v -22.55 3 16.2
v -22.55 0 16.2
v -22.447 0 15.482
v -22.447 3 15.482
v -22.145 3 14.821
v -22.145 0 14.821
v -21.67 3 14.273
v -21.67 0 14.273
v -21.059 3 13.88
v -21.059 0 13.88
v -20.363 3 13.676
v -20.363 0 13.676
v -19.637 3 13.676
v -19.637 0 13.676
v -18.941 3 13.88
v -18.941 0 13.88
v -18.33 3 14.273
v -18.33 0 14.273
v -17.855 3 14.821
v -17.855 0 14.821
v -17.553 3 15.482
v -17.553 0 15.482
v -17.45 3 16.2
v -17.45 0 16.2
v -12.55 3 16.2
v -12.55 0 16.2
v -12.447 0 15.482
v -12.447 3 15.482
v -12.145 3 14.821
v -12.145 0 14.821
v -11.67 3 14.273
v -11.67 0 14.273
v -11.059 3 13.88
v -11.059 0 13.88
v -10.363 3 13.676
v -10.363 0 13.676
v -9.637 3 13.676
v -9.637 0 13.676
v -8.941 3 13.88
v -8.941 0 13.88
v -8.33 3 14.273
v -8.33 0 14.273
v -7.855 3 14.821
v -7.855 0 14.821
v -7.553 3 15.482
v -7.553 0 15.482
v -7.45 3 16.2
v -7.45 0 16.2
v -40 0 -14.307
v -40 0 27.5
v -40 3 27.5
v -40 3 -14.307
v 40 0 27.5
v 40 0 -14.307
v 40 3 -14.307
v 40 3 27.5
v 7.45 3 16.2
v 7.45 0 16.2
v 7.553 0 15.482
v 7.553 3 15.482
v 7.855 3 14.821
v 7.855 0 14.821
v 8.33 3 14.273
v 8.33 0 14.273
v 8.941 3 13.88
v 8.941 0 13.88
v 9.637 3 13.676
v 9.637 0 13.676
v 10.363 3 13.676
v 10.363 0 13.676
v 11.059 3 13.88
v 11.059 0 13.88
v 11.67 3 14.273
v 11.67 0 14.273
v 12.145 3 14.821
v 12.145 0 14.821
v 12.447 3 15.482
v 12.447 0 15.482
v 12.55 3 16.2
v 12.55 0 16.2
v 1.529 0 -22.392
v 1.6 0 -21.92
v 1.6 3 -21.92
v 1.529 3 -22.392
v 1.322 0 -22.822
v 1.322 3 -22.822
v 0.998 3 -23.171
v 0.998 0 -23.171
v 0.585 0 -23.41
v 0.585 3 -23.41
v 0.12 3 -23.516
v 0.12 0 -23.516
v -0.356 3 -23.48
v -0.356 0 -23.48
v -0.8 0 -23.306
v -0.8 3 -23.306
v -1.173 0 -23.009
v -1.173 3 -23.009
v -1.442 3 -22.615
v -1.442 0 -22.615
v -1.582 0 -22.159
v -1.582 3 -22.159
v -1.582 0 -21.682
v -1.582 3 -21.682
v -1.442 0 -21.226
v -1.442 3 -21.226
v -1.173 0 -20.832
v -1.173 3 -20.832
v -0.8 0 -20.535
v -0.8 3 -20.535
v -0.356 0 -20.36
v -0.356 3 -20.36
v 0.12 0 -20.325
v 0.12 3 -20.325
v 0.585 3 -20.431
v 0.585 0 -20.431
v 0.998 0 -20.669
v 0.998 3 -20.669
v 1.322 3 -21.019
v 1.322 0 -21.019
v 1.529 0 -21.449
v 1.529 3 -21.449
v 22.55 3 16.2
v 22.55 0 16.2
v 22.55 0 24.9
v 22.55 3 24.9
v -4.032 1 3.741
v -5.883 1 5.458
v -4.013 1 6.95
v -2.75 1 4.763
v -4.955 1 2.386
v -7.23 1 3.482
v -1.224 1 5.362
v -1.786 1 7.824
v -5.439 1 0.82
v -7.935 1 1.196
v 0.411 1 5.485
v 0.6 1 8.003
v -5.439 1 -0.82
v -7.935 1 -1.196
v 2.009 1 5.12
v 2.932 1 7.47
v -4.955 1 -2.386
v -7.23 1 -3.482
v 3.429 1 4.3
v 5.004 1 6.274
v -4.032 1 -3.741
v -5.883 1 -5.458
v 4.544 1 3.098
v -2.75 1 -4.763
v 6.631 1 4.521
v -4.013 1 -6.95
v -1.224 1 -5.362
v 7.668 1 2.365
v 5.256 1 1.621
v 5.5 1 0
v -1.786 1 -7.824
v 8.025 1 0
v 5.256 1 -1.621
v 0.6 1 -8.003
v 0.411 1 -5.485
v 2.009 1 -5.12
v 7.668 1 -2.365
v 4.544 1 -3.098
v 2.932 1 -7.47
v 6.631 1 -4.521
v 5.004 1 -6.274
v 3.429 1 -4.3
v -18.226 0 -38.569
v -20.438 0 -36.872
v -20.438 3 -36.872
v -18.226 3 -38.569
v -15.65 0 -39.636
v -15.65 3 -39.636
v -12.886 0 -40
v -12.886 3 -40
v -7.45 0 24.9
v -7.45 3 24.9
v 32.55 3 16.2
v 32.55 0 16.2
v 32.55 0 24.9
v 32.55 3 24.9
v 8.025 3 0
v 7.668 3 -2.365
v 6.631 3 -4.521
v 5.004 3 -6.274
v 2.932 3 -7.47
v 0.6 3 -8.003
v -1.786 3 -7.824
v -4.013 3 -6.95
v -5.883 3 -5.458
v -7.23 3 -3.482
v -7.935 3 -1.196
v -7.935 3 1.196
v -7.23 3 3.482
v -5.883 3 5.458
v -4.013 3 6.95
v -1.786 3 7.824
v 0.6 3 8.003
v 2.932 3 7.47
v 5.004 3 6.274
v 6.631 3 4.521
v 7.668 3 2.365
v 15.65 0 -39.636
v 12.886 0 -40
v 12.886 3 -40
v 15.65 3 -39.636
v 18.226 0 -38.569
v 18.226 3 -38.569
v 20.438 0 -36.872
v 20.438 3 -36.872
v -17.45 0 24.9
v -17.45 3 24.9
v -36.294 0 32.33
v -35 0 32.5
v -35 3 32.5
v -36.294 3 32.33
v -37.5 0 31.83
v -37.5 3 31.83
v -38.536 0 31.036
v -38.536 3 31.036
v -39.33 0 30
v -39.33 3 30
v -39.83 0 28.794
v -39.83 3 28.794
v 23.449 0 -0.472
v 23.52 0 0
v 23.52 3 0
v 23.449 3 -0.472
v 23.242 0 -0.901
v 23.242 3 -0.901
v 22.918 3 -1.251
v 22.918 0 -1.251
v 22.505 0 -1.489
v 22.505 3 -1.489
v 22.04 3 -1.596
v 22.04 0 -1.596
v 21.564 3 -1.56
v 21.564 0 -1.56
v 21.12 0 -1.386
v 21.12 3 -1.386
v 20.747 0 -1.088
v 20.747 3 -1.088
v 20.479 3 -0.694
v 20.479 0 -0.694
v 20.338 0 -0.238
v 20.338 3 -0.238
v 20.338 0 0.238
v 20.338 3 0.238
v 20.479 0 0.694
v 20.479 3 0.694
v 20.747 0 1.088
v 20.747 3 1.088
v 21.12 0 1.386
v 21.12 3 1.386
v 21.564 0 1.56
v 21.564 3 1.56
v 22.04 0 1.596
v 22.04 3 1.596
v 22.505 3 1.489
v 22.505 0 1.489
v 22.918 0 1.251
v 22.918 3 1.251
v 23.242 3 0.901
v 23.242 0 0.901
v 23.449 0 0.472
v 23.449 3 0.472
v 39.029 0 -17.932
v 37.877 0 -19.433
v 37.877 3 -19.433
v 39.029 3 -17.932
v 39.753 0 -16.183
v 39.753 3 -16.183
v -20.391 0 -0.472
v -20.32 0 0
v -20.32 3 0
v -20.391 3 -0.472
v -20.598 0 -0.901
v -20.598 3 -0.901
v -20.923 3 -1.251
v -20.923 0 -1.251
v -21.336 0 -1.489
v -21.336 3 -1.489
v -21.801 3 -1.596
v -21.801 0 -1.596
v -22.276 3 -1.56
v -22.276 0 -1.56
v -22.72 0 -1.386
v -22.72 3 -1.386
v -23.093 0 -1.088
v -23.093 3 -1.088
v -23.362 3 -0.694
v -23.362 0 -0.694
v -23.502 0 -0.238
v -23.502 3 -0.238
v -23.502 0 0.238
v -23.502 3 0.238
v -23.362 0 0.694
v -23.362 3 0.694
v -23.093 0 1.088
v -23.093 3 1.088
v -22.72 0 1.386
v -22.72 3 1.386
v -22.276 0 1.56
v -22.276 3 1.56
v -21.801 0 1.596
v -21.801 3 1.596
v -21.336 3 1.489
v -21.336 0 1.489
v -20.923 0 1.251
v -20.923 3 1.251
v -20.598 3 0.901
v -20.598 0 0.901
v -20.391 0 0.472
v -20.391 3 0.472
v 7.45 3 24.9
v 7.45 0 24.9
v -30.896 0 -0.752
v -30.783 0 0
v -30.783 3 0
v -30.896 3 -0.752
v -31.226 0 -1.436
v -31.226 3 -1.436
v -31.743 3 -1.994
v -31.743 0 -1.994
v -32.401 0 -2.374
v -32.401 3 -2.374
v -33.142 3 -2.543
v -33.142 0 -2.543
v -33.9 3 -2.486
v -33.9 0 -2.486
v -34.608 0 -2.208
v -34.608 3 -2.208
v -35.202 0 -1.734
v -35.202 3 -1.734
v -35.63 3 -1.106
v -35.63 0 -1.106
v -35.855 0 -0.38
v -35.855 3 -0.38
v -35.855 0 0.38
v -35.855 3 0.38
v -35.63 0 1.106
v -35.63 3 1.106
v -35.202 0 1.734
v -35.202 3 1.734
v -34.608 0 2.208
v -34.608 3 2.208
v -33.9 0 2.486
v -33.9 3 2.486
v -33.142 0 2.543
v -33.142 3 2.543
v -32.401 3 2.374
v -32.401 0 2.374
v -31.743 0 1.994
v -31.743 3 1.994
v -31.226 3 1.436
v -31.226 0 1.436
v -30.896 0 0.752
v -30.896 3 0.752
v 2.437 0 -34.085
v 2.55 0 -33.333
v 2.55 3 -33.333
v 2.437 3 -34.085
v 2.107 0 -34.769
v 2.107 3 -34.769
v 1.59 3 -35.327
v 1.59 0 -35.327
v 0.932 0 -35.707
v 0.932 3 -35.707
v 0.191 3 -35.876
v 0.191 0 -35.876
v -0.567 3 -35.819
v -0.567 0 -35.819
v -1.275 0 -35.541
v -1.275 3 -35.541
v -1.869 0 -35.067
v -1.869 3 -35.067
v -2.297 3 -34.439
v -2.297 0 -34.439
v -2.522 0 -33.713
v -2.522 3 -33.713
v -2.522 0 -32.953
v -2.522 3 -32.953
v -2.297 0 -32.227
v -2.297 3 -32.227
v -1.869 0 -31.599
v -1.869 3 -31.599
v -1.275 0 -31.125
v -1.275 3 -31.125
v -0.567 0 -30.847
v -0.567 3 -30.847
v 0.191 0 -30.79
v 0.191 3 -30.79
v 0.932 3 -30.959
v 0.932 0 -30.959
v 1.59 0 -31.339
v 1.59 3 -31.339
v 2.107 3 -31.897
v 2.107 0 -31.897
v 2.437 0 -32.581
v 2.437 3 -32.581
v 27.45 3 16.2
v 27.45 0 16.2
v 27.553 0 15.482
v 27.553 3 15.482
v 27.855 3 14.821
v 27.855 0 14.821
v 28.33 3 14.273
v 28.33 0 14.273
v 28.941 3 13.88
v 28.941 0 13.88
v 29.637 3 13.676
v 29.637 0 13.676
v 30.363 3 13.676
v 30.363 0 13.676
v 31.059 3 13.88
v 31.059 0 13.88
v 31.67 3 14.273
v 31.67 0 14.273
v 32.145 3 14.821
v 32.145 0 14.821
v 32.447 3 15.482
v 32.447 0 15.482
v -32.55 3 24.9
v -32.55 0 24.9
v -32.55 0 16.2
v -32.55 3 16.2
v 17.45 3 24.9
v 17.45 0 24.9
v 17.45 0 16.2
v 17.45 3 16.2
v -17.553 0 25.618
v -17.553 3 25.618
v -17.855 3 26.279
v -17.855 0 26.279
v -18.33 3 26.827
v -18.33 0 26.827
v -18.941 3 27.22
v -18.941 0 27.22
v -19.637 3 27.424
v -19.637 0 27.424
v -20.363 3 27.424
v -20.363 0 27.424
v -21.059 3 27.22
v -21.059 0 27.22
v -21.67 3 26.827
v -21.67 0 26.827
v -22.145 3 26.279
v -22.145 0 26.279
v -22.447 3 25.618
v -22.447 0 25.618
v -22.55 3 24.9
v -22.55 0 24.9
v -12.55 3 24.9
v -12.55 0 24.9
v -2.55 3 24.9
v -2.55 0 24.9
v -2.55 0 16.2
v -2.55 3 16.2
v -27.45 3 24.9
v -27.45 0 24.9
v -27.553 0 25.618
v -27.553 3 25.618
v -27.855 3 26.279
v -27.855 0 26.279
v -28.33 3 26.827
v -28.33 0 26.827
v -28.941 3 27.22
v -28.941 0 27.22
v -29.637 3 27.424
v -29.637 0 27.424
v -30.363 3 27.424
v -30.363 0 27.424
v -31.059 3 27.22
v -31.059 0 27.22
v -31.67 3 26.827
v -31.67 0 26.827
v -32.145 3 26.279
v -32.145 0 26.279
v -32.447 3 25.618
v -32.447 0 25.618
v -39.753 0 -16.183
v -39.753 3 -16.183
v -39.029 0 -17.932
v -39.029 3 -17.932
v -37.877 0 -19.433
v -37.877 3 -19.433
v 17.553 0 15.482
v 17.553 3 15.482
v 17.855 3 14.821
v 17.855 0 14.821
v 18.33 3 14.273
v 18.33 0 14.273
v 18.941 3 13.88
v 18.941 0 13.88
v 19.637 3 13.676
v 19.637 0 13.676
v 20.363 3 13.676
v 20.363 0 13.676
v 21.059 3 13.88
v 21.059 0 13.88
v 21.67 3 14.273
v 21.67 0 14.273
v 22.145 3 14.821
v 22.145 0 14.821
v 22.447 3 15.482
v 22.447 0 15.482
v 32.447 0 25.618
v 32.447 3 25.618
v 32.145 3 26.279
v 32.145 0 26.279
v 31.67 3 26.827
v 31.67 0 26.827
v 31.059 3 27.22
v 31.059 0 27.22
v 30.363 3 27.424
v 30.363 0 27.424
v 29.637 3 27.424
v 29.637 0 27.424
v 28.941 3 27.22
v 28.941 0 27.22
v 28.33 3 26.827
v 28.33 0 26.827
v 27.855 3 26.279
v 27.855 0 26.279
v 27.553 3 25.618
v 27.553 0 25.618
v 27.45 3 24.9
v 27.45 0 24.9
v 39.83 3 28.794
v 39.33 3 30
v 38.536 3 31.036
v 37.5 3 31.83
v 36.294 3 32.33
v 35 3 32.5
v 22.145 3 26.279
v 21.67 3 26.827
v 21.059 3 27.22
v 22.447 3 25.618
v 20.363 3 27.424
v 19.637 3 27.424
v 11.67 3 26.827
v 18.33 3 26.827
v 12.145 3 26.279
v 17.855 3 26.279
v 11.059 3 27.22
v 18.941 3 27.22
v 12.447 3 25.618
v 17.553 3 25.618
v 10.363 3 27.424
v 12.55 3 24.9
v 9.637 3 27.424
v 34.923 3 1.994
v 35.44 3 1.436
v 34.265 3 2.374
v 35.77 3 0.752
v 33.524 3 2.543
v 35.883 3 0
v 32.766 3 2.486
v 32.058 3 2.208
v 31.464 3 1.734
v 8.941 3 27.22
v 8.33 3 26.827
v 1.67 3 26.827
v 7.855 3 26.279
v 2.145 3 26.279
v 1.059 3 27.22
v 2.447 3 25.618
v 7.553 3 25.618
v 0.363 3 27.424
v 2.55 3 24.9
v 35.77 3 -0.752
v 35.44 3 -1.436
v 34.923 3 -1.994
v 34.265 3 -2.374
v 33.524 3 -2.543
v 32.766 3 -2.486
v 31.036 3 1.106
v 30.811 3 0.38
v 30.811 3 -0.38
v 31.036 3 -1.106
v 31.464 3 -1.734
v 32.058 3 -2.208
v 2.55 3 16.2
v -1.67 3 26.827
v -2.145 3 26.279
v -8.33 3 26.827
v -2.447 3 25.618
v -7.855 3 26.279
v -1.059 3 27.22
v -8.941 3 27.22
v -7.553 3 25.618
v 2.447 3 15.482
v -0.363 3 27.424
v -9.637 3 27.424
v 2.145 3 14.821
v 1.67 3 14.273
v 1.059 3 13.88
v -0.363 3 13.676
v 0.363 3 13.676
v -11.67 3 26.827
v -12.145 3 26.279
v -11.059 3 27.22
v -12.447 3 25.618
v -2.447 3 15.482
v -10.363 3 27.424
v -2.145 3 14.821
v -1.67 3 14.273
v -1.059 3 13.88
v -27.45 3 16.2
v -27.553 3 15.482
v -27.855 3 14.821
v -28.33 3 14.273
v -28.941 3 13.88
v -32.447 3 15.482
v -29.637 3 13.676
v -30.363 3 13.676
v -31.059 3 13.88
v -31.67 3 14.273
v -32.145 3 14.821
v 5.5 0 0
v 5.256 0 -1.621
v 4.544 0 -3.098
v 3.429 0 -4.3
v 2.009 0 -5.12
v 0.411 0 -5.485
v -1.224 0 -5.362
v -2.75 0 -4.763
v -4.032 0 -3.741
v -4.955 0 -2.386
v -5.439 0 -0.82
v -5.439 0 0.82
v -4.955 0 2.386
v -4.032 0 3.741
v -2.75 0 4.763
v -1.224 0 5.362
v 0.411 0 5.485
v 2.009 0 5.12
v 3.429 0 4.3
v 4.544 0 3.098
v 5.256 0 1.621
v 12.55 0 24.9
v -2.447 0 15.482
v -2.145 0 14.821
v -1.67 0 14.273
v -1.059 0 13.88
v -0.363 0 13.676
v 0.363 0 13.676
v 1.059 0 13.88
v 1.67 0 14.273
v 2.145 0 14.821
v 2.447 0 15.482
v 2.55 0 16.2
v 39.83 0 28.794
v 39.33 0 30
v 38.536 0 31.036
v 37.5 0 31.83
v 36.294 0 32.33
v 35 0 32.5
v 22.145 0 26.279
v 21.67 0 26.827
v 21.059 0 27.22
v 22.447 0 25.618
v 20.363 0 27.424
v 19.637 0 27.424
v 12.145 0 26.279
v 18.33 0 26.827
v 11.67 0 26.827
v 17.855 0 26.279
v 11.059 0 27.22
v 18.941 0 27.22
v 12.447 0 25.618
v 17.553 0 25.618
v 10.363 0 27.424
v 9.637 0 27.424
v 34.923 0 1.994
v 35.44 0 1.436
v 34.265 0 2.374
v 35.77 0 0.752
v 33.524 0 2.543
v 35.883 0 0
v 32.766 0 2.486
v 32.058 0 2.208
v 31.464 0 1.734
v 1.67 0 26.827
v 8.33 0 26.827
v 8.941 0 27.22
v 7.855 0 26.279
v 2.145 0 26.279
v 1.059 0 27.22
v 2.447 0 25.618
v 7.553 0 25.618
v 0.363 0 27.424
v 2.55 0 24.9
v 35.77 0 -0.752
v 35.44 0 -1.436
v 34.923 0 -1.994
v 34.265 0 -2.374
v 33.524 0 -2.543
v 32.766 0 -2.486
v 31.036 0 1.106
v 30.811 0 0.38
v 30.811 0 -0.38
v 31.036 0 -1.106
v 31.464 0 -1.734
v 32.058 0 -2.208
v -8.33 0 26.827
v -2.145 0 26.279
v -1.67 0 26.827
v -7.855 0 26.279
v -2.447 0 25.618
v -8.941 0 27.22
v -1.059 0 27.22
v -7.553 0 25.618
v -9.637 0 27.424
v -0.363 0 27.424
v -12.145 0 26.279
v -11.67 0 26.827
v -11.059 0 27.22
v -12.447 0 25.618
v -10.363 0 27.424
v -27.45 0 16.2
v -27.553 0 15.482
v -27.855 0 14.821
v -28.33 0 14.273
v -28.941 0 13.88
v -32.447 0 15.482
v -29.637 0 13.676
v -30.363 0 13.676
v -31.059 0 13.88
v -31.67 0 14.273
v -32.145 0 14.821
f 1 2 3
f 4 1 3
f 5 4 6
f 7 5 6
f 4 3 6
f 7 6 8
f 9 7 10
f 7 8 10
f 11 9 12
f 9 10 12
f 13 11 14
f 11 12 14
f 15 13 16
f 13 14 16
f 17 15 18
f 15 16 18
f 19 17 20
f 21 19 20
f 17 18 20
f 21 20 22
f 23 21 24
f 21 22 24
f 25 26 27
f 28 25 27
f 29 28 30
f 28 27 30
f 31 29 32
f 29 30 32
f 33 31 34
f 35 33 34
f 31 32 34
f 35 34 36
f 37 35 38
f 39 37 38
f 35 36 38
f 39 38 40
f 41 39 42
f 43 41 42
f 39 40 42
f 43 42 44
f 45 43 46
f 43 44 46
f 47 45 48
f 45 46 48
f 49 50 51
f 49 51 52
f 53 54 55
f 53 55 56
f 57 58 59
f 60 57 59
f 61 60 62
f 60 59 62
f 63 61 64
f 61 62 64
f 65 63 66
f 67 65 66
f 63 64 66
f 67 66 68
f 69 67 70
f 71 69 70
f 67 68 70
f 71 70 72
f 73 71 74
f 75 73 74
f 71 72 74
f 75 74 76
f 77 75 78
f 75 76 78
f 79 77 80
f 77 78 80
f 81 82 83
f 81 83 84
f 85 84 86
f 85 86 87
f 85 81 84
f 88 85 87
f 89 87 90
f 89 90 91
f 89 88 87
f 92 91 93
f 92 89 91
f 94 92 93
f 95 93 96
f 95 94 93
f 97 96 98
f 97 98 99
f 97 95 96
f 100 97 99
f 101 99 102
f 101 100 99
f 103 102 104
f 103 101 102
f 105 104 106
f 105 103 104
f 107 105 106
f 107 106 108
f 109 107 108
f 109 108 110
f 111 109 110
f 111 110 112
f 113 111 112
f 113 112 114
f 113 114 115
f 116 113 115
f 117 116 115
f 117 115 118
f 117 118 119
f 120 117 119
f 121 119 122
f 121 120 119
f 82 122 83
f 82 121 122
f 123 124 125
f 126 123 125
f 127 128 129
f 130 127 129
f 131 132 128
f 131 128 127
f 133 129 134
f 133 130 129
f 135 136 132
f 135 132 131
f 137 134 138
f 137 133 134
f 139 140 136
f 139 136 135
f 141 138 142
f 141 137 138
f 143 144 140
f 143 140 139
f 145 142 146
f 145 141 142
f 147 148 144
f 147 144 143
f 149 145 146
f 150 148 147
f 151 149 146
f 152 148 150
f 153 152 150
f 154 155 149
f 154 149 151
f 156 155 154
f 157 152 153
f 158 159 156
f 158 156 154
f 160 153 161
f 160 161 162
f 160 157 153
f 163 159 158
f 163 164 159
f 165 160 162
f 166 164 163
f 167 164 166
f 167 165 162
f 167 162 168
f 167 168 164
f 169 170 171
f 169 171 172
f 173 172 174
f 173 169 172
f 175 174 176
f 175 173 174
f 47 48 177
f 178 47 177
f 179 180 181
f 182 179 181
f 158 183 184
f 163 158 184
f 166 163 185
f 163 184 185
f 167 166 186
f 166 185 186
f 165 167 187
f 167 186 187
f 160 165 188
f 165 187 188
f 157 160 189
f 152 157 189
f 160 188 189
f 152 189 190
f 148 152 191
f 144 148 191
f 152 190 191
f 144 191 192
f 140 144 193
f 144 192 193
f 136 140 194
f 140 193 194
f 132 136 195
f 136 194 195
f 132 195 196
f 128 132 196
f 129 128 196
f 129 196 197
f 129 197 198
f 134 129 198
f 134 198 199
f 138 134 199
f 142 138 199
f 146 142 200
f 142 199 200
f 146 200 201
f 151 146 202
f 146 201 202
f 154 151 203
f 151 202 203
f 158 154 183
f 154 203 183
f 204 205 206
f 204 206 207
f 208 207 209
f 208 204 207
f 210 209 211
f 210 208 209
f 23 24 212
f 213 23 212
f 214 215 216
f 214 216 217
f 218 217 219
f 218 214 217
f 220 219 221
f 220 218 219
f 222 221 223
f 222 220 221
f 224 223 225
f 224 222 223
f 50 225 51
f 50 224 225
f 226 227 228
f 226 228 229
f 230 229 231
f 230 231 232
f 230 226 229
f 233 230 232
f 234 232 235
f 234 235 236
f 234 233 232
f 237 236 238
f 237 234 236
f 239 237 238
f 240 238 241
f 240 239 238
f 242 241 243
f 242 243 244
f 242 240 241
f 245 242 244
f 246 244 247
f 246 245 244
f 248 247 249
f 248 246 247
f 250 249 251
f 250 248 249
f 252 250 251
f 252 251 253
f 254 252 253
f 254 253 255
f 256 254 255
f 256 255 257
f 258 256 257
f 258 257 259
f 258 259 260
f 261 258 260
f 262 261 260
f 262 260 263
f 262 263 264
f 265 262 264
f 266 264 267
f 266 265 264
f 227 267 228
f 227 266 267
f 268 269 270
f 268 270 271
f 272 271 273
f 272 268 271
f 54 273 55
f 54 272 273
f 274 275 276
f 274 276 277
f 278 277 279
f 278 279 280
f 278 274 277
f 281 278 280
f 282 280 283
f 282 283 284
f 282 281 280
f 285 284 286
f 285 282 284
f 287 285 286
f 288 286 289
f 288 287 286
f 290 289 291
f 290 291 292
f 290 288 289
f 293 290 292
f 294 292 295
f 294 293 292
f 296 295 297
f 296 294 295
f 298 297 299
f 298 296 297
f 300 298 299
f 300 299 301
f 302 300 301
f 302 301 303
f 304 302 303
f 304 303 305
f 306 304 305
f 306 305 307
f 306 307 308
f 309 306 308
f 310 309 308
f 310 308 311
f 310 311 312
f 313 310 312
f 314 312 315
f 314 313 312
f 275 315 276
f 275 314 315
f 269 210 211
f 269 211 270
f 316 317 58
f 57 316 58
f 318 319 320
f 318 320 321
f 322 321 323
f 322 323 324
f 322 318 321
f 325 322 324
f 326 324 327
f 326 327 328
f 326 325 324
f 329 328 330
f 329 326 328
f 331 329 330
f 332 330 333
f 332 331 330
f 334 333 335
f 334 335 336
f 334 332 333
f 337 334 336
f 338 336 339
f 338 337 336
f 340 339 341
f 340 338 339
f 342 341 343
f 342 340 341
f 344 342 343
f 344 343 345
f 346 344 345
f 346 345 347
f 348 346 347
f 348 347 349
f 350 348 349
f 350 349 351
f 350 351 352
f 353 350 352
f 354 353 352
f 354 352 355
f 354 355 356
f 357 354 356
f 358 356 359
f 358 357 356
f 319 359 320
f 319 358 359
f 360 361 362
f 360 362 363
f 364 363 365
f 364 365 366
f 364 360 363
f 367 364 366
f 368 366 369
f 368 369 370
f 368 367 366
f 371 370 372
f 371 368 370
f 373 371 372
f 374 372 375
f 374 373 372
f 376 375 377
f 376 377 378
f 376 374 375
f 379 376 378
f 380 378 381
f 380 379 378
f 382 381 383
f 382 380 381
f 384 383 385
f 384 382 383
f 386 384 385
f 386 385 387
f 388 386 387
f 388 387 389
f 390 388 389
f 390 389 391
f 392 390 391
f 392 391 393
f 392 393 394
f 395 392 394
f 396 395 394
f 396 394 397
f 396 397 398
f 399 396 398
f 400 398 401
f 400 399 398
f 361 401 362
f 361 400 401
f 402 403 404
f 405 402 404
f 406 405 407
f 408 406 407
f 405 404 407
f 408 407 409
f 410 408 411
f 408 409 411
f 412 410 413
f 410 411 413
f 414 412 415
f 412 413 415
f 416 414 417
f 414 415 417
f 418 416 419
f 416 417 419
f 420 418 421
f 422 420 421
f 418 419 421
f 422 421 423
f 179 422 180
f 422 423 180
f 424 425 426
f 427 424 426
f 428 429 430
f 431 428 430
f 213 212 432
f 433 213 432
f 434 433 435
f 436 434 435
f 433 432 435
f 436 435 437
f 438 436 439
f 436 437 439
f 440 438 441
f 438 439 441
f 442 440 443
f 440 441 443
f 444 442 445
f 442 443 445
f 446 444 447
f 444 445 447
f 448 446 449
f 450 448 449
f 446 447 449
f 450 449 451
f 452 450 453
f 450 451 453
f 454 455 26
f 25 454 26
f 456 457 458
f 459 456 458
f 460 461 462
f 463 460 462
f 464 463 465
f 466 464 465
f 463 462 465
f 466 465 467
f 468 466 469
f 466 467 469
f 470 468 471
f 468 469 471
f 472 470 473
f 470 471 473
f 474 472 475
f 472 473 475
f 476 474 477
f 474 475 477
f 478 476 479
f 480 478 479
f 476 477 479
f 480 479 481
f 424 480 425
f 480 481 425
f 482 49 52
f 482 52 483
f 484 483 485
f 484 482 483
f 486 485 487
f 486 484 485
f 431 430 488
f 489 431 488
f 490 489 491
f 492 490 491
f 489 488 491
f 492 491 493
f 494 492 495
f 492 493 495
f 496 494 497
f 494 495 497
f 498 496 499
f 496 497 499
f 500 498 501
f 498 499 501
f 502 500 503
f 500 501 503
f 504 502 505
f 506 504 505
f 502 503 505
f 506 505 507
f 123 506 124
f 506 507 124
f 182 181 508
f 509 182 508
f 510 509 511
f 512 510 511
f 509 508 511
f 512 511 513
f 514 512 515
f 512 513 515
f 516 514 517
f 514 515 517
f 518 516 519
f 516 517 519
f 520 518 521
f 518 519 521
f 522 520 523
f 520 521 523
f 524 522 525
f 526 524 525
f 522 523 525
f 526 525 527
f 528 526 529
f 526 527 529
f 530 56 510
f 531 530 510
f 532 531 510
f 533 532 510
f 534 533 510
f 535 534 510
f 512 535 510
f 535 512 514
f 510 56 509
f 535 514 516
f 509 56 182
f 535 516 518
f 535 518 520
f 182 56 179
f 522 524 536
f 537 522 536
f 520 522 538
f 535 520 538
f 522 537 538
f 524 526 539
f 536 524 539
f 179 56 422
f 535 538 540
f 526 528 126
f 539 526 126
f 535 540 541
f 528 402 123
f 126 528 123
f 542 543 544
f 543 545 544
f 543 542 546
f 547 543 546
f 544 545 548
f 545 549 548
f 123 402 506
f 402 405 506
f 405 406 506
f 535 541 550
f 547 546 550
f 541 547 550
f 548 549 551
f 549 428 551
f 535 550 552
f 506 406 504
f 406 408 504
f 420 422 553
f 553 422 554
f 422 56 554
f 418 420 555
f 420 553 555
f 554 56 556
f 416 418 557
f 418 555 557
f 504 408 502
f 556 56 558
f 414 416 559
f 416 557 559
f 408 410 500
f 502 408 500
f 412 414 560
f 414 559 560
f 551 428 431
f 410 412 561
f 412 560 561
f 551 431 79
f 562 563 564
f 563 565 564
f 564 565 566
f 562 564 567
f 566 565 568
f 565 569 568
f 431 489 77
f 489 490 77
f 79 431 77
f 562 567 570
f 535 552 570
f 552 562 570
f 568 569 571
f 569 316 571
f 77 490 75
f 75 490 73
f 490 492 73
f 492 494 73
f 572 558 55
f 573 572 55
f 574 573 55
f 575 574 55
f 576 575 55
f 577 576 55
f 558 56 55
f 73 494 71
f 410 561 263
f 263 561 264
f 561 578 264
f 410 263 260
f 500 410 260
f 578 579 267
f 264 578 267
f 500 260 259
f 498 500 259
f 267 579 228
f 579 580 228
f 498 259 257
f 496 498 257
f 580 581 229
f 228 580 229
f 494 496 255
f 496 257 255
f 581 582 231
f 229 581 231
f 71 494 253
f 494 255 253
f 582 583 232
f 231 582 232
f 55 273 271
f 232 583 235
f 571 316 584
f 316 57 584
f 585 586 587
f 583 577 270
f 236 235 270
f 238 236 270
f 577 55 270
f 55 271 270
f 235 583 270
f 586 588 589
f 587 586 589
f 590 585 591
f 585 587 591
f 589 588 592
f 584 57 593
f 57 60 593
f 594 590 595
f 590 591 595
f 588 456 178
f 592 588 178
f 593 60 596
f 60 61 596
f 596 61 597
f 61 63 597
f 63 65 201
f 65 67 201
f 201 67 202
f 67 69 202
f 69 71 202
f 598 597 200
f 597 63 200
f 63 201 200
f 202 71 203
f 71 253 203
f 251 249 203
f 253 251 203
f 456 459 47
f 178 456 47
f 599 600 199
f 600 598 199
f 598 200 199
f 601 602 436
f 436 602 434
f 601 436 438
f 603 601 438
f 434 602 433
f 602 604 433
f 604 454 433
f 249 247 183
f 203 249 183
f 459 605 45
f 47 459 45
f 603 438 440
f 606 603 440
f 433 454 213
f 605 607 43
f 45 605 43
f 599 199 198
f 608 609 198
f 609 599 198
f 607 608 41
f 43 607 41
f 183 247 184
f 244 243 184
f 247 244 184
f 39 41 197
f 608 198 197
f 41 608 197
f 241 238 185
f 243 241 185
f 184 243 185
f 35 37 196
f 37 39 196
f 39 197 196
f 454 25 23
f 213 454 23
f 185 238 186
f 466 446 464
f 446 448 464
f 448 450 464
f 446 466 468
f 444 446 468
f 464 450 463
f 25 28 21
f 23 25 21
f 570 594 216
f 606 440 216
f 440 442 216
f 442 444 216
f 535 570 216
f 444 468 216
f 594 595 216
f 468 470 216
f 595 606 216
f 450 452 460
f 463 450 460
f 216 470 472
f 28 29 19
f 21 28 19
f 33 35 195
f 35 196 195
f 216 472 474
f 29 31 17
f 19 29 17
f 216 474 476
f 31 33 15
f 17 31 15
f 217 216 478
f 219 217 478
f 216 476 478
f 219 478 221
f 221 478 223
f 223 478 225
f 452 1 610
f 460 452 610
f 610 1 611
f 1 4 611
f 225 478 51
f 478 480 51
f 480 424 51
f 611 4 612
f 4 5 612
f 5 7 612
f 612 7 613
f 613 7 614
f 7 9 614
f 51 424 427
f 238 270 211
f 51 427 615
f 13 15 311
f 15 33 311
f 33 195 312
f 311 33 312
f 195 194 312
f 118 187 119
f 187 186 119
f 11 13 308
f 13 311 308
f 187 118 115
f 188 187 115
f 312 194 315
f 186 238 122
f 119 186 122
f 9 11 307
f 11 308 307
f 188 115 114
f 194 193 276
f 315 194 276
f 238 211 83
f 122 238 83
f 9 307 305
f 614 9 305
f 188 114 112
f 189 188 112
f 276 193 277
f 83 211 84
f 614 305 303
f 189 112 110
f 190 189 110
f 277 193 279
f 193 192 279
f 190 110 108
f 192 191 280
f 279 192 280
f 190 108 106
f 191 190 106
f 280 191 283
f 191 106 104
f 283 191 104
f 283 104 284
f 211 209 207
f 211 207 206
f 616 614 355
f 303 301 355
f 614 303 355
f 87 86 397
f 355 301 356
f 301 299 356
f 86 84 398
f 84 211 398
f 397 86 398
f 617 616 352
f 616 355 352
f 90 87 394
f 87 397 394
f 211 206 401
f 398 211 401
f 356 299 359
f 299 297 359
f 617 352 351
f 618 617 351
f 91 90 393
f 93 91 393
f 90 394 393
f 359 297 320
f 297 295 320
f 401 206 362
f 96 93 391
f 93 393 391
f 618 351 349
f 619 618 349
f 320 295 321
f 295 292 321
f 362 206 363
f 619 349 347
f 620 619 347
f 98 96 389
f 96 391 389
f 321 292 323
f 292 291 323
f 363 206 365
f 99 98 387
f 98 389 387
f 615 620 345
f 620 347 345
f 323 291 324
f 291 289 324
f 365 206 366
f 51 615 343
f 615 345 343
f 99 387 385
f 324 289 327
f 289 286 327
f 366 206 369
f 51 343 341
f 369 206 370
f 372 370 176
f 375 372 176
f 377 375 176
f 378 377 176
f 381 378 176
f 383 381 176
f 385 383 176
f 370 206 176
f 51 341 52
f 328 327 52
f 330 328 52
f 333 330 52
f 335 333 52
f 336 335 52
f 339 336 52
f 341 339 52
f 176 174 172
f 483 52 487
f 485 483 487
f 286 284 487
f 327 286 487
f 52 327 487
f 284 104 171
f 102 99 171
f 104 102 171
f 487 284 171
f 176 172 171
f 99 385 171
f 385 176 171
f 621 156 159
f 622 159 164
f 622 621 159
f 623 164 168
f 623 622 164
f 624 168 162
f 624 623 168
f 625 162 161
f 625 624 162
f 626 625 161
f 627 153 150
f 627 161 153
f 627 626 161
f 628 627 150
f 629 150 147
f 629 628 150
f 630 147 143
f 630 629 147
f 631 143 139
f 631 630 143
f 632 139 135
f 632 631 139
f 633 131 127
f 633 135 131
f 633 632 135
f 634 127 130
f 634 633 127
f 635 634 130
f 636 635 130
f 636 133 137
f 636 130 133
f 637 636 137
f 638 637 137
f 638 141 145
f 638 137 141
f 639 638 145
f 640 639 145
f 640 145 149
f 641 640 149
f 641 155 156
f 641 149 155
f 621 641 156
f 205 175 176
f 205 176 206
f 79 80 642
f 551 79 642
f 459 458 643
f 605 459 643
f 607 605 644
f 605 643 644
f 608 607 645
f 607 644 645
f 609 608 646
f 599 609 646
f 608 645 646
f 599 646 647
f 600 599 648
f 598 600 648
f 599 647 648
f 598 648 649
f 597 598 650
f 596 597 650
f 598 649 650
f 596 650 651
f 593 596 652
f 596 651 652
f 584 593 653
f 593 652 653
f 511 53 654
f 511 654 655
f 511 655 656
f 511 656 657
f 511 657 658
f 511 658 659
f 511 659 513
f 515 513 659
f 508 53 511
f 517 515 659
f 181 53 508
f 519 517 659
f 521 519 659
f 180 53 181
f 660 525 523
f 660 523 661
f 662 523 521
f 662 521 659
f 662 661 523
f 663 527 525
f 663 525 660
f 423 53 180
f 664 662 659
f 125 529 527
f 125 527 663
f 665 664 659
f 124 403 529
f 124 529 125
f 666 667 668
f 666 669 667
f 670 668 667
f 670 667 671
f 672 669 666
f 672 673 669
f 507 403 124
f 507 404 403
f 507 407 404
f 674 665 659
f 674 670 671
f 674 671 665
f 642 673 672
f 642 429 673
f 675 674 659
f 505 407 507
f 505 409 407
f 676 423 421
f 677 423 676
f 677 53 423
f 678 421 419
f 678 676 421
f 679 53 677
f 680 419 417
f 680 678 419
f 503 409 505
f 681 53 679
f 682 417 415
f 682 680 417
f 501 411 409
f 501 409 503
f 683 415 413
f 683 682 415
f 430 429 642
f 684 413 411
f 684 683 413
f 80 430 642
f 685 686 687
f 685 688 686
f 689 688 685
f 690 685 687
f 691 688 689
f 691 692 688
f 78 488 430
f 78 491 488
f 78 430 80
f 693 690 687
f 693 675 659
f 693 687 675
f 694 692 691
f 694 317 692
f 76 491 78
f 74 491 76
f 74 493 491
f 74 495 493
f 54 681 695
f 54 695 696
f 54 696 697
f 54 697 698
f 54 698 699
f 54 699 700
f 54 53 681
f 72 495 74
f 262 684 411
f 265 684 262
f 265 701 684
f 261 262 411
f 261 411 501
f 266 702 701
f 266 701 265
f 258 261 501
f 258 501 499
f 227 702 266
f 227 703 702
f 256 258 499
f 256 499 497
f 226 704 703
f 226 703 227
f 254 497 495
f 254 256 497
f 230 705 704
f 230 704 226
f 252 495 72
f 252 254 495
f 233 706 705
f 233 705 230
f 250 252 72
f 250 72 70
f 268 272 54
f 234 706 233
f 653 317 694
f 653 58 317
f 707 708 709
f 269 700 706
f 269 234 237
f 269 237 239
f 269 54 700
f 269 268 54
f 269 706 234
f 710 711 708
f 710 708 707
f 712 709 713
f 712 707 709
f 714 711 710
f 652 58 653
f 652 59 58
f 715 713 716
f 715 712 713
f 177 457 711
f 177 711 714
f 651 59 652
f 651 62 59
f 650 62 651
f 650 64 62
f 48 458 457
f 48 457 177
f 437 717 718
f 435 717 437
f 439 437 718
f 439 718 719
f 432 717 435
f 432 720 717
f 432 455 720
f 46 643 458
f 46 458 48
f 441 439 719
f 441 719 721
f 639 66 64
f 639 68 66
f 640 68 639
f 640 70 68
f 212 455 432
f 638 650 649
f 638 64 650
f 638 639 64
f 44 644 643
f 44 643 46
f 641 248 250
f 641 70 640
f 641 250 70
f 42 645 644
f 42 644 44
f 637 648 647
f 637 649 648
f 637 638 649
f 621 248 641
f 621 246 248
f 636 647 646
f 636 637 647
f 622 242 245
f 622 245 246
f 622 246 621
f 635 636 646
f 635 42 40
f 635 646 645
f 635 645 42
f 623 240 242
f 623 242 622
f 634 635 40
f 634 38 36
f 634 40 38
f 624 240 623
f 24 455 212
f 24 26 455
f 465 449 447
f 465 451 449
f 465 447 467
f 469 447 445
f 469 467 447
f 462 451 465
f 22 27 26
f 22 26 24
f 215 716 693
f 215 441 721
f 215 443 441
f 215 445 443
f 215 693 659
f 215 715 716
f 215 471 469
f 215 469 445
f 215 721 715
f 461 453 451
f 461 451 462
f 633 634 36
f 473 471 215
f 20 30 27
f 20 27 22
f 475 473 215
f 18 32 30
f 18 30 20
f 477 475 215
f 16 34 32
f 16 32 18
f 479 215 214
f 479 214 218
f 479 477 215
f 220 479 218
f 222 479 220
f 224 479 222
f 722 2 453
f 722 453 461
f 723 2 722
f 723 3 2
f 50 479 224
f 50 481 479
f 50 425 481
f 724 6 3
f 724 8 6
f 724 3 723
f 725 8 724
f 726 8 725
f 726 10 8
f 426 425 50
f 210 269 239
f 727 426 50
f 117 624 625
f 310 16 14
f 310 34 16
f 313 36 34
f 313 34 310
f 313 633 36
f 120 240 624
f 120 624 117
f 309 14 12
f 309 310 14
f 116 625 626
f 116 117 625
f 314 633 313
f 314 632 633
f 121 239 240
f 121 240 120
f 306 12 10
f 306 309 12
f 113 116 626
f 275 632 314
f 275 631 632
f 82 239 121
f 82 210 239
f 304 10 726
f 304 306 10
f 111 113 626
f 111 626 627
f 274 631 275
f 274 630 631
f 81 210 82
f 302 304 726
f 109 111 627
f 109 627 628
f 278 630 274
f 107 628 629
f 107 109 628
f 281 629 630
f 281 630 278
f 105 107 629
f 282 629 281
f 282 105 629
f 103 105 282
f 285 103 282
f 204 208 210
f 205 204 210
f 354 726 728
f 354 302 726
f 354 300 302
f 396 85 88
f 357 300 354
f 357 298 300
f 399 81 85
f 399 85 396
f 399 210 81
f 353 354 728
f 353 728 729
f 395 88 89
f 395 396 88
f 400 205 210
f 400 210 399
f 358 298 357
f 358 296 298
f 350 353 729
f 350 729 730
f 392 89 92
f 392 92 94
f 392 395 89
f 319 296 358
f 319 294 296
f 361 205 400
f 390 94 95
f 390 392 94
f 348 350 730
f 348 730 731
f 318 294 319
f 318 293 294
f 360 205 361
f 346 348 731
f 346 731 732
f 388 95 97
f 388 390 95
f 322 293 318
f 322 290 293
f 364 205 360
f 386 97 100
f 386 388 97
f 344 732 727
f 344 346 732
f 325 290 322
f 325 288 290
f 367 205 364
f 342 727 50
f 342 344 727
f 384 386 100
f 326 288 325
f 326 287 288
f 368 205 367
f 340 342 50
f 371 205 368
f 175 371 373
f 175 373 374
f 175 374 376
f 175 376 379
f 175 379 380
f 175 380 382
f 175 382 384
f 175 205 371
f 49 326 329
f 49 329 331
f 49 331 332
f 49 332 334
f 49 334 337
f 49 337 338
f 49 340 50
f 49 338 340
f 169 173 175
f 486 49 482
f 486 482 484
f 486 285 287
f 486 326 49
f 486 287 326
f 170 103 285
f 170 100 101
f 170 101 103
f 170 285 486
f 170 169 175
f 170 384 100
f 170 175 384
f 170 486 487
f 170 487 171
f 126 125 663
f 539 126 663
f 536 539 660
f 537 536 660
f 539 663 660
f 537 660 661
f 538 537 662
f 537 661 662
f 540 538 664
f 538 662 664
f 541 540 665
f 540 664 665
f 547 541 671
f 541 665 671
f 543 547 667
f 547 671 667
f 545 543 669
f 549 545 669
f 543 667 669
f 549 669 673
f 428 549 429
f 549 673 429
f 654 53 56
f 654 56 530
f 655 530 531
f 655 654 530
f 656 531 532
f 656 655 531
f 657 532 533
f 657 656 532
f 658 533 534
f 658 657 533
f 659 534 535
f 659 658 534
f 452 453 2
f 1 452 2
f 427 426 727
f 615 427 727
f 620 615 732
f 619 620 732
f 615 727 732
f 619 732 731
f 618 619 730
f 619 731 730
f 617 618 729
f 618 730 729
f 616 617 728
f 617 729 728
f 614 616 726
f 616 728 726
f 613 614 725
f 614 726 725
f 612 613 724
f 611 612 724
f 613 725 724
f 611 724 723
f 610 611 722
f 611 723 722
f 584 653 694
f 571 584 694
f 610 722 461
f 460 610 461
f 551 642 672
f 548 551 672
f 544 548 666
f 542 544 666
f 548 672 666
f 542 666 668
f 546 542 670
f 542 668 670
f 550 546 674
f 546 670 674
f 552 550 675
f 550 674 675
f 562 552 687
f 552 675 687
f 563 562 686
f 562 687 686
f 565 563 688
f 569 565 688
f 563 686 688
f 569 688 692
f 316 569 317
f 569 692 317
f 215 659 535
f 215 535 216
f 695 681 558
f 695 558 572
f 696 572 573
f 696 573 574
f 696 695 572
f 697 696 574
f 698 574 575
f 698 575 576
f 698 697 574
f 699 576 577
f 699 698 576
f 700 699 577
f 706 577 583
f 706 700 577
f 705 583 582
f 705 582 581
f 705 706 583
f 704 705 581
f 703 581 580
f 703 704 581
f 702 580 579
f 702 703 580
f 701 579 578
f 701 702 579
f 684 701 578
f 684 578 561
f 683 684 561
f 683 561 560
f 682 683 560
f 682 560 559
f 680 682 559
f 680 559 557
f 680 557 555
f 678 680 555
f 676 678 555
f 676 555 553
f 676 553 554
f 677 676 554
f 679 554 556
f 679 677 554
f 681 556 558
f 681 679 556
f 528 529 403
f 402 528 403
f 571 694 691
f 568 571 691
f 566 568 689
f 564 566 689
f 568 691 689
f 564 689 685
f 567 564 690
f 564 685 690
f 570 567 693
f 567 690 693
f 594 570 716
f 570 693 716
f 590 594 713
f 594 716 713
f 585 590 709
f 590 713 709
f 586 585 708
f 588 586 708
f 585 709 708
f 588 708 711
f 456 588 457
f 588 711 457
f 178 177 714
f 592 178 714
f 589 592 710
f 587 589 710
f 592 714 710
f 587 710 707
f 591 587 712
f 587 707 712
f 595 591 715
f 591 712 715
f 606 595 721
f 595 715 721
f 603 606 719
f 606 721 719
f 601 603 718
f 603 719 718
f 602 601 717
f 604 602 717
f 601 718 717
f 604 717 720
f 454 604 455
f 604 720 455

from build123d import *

# Parameters (mm, degrees)
SKETCH1_R           = 1.6
SKETCH1_R_2         = 5.5
SKETCH1_R_3         = 2.55
BOSS_EXTRUDE1_DEPTH = 3
SKETCH2_R           = 8.025
CUT_EXTRUDE1_DEPTH  = 2


with BuildPart() as part:
    # Sketch1 → Boss-Extrude1 (new body)
    with BuildSketch(Plane(origin=(0, 0, 0), x_dir=(1, 0, 0), z_dir=(0, 1, 0))):
        with BuildLine():
            Line((35, -32.5), (-35, -32.5))
            ThreePointArc((-35, -32.5), (-38.535533906, -31.035533906), (-40, -27.5))
            Line((-40, -27.5), (-40, 14.306951673))
            ThreePointArc((-40, 14.306951673), (-39.448126611, 17.081406557), (-37.876524164, 19.433475836))
            Line((-37.876524164, 19.433475836), (-20.438099577, 36.871900423))
            ThreePointArc((-20.438099577, 36.871900423), (-16.973258212, 39.187033407), (-12.886199154, 40))
            Line((-12.886199154, 40), (12.886199154, 40))
            ThreePointArc((12.886199154, 40), (16.973258212, 39.187033407), (20.438099577, 36.871900423))
            Line((20.438099577, 36.871900423), (37.876524164, 19.433475836))
            ThreePointArc((37.876524164, 19.433475836), (39.448126611, 17.081406557), (40, 14.306951673))
            Line((40, 14.306951673), (40, -27.5))
            ThreePointArc((40, -27.5), (38.535533906, -31.035533906), (35, -32.5))
        make_face()
        with Locations((21.920310217, 0)):
            Circle(SKETCH1_R, mode=Mode.SUBTRACT)
        with Locations((-21.920310217, 0)):
            Circle(SKETCH1_R, mode=Mode.SUBTRACT)
        Circle(SKETCH1_R_2, mode=Mode.SUBTRACT)
        with Locations((0, 21.920310217)):
            Circle(SKETCH1_R, mode=Mode.SUBTRACT)
        with Locations((-33.333013665, 0)):
            Circle(SKETCH1_R_3, mode=Mode.SUBTRACT)
        with Locations((0, 33.333013665)):
            Circle(SKETCH1_R_3, mode=Mode.SUBTRACT)
        with Locations((33.333013665, 0)):
            Circle(SKETCH1_R_3, mode=Mode.SUBTRACT)
        with BuildLine():
            Line((27.45, -24.9), (27.45, -16.2))
            ThreePointArc((27.45, -16.2), (30, -13.65), (32.55, -16.2))
            Line((32.55, -16.2), (32.55, -24.9))
            ThreePointArc((32.55, -24.9), (30, -27.45), (27.45, -24.9))
        make_face(mode=Mode.SUBTRACT)
        with BuildLine():
            Line((17.45, -24.9), (17.45, -16.2))
            ThreePointArc((17.45, -16.2), (20, -13.65), (22.55, -16.2))
            Line((22.55, -16.2), (22.55, -24.9))
            ThreePointArc((22.55, -24.9), (20, -27.45), (17.45, -24.9))
        make_face(mode=Mode.SUBTRACT)
        with BuildLine():
            Line((7.45, -24.9), (7.45, -16.2))
            ThreePointArc((7.45, -16.2), (10, -13.65), (12.55, -16.2))
            Line((12.55, -16.2), (12.55, -24.9))
            ThreePointArc((12.55, -24.9), (10, -27.45), (7.45, -24.9))
        make_face(mode=Mode.SUBTRACT)
        with BuildLine():
            Line((-2.55, -24.9), (-2.55, -16.2))
            ThreePointArc((-2.55, -16.2), (0, -13.65), (2.55, -16.2))
            Line((2.55, -16.2), (2.55, -24.9))
            ThreePointArc((2.55, -24.9), (0, -27.45), (-2.55, -24.9))
        make_face(mode=Mode.SUBTRACT)
        with BuildLine():
            Line((-12.55, -24.9), (-12.55, -16.2))
            ThreePointArc((-12.55, -16.2), (-10, -13.65), (-7.45, -16.2))
            Line((-7.45, -16.2), (-7.45, -24.9))
            ThreePointArc((-7.45, -24.9), (-10, -27.45), (-12.55, -24.9))
        make_face(mode=Mode.SUBTRACT)
        with BuildLine():
            Line((-22.55, -24.9), (-22.55, -16.2))
            ThreePointArc((-22.55, -16.2), (-20, -13.65), (-17.45, -16.2))
            Line((-17.45, -16.2), (-17.45, -24.9))
            ThreePointArc((-17.45, -24.9), (-20, -27.45), (-22.55, -24.9))
        make_face(mode=Mode.SUBTRACT)
        with BuildLine():
            Line((-32.55, -24.9), (-32.55, -16.2))
            ThreePointArc((-32.55, -16.2), (-30, -13.65), (-27.45, -16.2))
            Line((-27.45, -16.2), (-27.45, -24.9))
            ThreePointArc((-27.45, -24.9), (-30, -27.45), (-32.55, -24.9))
        make_face(mode=Mode.SUBTRACT)
    extrude(amount=BOSS_EXTRUDE1_DEPTH)

    # Sketch2 → Cut-Extrude1 (cut)
    with BuildSketch(Plane(origin=(0, 3, 0), x_dir=(1, 0, 0), z_dir=(0, 1, 0))):
        Circle(SKETCH2_R)
    extrude(amount=-CUT_EXTRUDE1_DEPTH, mode=Mode.SUBTRACT)


solid = part.part
